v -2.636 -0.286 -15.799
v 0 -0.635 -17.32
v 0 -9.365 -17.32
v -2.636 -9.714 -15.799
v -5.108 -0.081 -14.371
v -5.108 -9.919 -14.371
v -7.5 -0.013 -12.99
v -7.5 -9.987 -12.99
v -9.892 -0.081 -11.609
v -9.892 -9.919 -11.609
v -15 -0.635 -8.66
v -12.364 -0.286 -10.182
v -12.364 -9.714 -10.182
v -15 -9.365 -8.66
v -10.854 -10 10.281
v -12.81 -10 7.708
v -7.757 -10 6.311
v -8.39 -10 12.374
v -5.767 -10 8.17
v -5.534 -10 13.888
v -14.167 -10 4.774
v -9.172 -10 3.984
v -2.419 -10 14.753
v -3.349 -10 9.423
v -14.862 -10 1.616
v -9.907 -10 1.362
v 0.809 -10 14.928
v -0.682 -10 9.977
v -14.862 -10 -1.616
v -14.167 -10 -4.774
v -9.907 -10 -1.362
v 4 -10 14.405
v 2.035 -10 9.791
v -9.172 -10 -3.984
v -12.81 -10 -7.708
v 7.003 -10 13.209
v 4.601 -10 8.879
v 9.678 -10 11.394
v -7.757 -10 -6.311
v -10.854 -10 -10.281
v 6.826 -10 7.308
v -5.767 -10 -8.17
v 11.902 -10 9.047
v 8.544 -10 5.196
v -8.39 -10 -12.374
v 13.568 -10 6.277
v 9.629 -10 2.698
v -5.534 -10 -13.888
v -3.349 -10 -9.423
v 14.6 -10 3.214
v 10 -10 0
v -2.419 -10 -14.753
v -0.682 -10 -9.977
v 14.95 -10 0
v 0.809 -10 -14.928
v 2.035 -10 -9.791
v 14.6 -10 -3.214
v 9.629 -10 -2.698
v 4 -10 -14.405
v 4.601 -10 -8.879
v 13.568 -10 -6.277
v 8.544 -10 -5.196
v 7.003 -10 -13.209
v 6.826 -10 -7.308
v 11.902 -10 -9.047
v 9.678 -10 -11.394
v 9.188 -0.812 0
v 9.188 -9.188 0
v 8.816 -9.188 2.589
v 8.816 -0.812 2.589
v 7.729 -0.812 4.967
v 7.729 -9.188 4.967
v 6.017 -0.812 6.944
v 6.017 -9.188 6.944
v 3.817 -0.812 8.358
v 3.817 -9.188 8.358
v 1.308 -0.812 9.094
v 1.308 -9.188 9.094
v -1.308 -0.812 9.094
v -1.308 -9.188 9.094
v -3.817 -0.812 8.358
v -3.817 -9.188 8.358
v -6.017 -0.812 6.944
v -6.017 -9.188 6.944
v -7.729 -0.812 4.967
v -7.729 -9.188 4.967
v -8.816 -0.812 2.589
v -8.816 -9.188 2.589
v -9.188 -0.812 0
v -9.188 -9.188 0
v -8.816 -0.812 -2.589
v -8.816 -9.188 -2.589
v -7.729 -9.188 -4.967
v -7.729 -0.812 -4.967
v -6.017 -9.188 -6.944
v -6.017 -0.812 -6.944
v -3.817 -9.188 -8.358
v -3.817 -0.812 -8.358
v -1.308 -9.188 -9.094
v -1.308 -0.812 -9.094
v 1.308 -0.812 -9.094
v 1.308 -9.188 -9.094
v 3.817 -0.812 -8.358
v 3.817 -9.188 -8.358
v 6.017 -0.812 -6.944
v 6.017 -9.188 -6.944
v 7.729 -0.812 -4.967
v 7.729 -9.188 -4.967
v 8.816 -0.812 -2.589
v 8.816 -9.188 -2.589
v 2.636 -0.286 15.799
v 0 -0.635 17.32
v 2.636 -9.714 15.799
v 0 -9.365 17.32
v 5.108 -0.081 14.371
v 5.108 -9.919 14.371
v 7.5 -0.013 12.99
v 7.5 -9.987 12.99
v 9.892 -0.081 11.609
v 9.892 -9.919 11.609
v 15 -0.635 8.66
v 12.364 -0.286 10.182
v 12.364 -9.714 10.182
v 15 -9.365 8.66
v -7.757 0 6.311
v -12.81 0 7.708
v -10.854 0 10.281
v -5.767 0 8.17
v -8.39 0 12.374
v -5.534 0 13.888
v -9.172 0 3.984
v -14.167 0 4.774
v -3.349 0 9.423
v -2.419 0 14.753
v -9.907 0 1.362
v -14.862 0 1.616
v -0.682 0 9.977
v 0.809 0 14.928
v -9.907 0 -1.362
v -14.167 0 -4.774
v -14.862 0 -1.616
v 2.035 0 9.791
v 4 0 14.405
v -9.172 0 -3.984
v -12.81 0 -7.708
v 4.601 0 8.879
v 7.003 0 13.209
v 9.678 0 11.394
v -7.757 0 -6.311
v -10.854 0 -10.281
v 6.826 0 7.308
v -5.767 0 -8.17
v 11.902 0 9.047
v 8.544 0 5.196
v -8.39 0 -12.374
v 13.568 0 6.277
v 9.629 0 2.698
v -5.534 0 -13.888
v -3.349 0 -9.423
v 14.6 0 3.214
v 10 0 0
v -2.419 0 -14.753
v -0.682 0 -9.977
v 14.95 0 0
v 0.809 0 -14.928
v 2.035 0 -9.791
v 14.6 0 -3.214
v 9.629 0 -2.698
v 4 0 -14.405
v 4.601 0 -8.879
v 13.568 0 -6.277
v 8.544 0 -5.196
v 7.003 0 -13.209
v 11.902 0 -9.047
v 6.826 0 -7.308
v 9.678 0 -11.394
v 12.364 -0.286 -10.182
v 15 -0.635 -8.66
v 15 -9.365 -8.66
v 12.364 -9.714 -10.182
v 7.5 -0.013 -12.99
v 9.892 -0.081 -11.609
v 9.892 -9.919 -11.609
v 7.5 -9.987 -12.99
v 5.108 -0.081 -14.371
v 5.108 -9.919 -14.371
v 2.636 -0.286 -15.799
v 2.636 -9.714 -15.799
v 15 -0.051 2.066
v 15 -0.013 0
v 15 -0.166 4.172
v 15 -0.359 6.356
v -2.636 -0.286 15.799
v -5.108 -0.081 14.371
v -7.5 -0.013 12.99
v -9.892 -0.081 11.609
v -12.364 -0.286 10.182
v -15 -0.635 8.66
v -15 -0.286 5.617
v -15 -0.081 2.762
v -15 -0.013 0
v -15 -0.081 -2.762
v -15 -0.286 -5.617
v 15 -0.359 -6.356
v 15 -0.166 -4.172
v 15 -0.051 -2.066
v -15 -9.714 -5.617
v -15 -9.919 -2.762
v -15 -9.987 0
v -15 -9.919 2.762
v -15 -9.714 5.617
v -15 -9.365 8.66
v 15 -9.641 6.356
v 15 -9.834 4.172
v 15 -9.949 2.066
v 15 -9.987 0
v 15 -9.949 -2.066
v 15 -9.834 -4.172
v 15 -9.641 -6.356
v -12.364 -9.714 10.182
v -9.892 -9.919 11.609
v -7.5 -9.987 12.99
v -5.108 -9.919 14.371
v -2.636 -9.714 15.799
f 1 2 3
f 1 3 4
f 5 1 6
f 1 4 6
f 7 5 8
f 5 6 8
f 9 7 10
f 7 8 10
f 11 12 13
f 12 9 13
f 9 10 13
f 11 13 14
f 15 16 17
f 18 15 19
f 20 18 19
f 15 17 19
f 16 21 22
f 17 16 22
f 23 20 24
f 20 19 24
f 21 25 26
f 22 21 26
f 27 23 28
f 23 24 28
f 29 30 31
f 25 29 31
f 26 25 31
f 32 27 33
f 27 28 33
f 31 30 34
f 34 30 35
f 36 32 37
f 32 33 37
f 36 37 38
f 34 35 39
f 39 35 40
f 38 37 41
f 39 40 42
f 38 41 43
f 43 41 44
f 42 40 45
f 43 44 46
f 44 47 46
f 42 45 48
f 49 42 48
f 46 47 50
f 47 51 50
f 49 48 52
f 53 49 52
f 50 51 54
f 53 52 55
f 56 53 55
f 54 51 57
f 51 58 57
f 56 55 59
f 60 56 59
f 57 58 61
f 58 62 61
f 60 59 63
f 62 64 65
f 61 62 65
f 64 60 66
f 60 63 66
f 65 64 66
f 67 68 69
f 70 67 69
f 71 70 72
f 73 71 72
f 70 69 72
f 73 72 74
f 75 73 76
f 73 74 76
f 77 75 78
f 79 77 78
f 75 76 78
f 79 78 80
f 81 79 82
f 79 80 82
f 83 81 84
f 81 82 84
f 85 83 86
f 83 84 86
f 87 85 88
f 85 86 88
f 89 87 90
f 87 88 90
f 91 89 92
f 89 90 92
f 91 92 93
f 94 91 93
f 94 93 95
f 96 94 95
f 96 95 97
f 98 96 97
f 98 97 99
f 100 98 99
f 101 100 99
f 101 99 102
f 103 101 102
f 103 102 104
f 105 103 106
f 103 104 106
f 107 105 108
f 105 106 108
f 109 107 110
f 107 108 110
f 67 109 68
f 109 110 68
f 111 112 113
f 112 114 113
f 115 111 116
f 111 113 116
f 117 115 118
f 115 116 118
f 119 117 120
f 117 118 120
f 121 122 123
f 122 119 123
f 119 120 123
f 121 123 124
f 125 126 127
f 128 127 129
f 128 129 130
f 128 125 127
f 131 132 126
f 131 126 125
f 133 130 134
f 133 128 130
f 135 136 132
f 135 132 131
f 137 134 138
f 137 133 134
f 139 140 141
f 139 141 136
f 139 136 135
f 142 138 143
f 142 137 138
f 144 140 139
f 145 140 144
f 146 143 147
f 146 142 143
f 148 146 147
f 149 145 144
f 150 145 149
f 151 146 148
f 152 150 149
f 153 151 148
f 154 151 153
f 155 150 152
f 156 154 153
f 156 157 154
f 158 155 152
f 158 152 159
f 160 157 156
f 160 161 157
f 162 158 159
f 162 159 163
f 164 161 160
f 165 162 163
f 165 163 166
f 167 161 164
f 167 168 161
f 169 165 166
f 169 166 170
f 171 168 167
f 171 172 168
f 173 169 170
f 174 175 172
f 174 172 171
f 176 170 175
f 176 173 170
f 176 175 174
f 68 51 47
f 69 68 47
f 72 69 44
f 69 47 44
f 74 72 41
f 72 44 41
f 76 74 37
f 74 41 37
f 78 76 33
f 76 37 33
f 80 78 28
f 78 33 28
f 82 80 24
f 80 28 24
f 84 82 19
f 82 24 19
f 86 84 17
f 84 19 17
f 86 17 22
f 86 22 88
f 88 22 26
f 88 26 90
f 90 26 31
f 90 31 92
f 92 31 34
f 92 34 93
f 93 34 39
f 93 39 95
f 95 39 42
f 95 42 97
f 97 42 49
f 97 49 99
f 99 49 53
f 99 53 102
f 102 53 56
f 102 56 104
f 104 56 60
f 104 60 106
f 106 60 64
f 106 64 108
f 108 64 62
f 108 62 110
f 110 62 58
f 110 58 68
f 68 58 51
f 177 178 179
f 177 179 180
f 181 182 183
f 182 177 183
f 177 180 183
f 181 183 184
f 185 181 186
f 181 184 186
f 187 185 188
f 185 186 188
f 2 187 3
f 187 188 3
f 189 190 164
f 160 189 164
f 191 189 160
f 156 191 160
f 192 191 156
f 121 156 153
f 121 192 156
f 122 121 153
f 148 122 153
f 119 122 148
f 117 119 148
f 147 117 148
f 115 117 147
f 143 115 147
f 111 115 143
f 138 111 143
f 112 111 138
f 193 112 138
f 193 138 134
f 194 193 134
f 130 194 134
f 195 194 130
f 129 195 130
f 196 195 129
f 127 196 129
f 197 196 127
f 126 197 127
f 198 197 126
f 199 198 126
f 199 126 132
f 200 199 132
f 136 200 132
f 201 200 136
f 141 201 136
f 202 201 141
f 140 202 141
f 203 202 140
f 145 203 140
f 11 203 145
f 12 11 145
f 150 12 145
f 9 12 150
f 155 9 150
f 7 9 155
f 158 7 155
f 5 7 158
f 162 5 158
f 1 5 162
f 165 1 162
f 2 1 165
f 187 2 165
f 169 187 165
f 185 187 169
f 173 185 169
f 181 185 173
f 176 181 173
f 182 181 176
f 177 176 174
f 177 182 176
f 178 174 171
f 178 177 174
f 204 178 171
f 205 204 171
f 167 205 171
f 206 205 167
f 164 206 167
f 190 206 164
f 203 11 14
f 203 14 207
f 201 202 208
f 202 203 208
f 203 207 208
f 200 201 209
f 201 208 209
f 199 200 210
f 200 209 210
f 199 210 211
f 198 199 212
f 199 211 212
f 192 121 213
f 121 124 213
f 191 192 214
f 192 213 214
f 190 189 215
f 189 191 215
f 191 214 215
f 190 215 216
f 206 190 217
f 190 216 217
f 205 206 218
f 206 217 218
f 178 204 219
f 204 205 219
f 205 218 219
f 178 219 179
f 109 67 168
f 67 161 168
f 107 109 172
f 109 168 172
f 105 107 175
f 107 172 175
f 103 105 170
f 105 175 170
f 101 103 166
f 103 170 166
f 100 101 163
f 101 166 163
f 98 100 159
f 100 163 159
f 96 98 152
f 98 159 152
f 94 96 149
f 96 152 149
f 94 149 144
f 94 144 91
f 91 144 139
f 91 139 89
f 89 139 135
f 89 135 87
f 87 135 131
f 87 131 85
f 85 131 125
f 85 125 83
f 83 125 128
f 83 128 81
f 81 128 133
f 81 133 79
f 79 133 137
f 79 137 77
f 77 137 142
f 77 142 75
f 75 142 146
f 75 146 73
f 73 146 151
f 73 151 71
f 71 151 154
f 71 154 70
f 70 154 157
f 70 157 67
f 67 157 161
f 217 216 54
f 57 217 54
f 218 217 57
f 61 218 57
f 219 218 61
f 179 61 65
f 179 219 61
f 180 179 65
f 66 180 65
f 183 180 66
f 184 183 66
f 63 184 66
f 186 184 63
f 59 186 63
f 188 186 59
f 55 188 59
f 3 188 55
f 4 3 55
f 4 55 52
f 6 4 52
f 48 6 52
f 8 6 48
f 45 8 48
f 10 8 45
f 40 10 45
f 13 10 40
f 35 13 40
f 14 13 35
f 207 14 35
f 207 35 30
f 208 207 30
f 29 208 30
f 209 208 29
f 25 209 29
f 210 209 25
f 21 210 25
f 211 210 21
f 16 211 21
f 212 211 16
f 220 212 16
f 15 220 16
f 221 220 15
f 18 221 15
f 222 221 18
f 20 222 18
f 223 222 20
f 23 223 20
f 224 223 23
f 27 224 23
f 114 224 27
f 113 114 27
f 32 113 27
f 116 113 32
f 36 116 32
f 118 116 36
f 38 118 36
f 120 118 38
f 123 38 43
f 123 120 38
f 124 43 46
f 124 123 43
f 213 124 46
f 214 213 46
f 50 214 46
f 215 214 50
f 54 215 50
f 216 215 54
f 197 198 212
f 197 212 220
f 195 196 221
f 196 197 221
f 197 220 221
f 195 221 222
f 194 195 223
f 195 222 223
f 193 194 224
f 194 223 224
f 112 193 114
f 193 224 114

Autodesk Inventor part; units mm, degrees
sketch "Sketch_1" plane through (0, 0, 0) normal (0, 0, 1) x (1, 0, 0)
  line L0 (0, -10) -> (0, 0)
  line L1 (0, 0) -> (14.95, 0)
  line L2 (14.95, 0) -> (33.6103, -5)
  line L3 (33.6103, -5) -> (14.95, -10)
  line L4 (14.95, -10) -> (0, -10)
  line L5 (0, -10) -> (0, 0)
revolve "Revolution1" add sketch "Sketch_1" angle 360 about axis through (0, -10, 0) along (0, 1, 0)
sketch "Sketch_2" plane through (0, 0, 0) normal (0, 1, 0) x (-1, 0, 0)
  line L0 (60, -60) -> (60, 60)
  line L1 (60, 60) -> (-60, 60)
  line L2 (-60, 60) -> (-60, -60)
  line L3 (-60, -60) -> (60, -60)
  line L4 (15, 8.6603) -> (0, 17.3205)
  line L5 (0, 17.3205) -> (-15, 8.6603)
  line L6 (-15, 8.6603) -> (-15, -8.6603)
  line L7 (-15, -8.6603) -> (0, -17.3205)
  line L8 (0, -17.3205) -> (15, -8.6603)
  line L9 (15, -8.6603) -> (15, 8.6603)
extrude "Extrusion1" cut sketch "Sketch_2" along normal mid plane 22
sketch "Sketch_3" plane through (0, 0, 0) normal (0, 0, 1) x (1, 0, 0)
  line L0 (0, -10) -> (0, 0)
  line L1 (0, 0) -> (10, 0)
  line L2 (10, 0) -> (9.188, -0.812)
  line L3 (9.188, -0.812) -> (9.188, -9.188)
  line L4 (9.188, -9.188) -> (10, -10)
  line L5 (10, -10) -> (0, -10)
  line L6 (0, -10) -> (0, 0)
revolve "Revolution2" cut sketch "Sketch_3" angle 360 about axis through (0, -10, 0) along (0, -1, 0)
thread "Thread1" size "M20x1.5" class "6H" standard "ISO Metric profile" full length
ref_plane "2CYL_XY" through (0, -5, 0) normal (0, 1, 0) x (1, 0, 0)
ref_plane "2CYL_YZ" through (0, -5, 0) normal (1, 0, 0) x (0, 0, -1)
ref_plane "2CYL_ZX" through (0, -5, 0) normal (0, 0, -1) x (0, 1, 0)
ref_plane "din439b_punkt_XY" through (0, 0, 0) normal (0, 1, 0) x (1, 0, 0)
ref_plane "din439b_punkt_YZ" through (0, 0, 0) normal (1, 0, 0) x (0, 0, -1)
ref_plane "din439b_punkt_ZX" through (0, 0, 0) normal (0, 0, -1) x (0, 1, 0)
properties part number "DIN-439-B - M20x1.5(F)"
